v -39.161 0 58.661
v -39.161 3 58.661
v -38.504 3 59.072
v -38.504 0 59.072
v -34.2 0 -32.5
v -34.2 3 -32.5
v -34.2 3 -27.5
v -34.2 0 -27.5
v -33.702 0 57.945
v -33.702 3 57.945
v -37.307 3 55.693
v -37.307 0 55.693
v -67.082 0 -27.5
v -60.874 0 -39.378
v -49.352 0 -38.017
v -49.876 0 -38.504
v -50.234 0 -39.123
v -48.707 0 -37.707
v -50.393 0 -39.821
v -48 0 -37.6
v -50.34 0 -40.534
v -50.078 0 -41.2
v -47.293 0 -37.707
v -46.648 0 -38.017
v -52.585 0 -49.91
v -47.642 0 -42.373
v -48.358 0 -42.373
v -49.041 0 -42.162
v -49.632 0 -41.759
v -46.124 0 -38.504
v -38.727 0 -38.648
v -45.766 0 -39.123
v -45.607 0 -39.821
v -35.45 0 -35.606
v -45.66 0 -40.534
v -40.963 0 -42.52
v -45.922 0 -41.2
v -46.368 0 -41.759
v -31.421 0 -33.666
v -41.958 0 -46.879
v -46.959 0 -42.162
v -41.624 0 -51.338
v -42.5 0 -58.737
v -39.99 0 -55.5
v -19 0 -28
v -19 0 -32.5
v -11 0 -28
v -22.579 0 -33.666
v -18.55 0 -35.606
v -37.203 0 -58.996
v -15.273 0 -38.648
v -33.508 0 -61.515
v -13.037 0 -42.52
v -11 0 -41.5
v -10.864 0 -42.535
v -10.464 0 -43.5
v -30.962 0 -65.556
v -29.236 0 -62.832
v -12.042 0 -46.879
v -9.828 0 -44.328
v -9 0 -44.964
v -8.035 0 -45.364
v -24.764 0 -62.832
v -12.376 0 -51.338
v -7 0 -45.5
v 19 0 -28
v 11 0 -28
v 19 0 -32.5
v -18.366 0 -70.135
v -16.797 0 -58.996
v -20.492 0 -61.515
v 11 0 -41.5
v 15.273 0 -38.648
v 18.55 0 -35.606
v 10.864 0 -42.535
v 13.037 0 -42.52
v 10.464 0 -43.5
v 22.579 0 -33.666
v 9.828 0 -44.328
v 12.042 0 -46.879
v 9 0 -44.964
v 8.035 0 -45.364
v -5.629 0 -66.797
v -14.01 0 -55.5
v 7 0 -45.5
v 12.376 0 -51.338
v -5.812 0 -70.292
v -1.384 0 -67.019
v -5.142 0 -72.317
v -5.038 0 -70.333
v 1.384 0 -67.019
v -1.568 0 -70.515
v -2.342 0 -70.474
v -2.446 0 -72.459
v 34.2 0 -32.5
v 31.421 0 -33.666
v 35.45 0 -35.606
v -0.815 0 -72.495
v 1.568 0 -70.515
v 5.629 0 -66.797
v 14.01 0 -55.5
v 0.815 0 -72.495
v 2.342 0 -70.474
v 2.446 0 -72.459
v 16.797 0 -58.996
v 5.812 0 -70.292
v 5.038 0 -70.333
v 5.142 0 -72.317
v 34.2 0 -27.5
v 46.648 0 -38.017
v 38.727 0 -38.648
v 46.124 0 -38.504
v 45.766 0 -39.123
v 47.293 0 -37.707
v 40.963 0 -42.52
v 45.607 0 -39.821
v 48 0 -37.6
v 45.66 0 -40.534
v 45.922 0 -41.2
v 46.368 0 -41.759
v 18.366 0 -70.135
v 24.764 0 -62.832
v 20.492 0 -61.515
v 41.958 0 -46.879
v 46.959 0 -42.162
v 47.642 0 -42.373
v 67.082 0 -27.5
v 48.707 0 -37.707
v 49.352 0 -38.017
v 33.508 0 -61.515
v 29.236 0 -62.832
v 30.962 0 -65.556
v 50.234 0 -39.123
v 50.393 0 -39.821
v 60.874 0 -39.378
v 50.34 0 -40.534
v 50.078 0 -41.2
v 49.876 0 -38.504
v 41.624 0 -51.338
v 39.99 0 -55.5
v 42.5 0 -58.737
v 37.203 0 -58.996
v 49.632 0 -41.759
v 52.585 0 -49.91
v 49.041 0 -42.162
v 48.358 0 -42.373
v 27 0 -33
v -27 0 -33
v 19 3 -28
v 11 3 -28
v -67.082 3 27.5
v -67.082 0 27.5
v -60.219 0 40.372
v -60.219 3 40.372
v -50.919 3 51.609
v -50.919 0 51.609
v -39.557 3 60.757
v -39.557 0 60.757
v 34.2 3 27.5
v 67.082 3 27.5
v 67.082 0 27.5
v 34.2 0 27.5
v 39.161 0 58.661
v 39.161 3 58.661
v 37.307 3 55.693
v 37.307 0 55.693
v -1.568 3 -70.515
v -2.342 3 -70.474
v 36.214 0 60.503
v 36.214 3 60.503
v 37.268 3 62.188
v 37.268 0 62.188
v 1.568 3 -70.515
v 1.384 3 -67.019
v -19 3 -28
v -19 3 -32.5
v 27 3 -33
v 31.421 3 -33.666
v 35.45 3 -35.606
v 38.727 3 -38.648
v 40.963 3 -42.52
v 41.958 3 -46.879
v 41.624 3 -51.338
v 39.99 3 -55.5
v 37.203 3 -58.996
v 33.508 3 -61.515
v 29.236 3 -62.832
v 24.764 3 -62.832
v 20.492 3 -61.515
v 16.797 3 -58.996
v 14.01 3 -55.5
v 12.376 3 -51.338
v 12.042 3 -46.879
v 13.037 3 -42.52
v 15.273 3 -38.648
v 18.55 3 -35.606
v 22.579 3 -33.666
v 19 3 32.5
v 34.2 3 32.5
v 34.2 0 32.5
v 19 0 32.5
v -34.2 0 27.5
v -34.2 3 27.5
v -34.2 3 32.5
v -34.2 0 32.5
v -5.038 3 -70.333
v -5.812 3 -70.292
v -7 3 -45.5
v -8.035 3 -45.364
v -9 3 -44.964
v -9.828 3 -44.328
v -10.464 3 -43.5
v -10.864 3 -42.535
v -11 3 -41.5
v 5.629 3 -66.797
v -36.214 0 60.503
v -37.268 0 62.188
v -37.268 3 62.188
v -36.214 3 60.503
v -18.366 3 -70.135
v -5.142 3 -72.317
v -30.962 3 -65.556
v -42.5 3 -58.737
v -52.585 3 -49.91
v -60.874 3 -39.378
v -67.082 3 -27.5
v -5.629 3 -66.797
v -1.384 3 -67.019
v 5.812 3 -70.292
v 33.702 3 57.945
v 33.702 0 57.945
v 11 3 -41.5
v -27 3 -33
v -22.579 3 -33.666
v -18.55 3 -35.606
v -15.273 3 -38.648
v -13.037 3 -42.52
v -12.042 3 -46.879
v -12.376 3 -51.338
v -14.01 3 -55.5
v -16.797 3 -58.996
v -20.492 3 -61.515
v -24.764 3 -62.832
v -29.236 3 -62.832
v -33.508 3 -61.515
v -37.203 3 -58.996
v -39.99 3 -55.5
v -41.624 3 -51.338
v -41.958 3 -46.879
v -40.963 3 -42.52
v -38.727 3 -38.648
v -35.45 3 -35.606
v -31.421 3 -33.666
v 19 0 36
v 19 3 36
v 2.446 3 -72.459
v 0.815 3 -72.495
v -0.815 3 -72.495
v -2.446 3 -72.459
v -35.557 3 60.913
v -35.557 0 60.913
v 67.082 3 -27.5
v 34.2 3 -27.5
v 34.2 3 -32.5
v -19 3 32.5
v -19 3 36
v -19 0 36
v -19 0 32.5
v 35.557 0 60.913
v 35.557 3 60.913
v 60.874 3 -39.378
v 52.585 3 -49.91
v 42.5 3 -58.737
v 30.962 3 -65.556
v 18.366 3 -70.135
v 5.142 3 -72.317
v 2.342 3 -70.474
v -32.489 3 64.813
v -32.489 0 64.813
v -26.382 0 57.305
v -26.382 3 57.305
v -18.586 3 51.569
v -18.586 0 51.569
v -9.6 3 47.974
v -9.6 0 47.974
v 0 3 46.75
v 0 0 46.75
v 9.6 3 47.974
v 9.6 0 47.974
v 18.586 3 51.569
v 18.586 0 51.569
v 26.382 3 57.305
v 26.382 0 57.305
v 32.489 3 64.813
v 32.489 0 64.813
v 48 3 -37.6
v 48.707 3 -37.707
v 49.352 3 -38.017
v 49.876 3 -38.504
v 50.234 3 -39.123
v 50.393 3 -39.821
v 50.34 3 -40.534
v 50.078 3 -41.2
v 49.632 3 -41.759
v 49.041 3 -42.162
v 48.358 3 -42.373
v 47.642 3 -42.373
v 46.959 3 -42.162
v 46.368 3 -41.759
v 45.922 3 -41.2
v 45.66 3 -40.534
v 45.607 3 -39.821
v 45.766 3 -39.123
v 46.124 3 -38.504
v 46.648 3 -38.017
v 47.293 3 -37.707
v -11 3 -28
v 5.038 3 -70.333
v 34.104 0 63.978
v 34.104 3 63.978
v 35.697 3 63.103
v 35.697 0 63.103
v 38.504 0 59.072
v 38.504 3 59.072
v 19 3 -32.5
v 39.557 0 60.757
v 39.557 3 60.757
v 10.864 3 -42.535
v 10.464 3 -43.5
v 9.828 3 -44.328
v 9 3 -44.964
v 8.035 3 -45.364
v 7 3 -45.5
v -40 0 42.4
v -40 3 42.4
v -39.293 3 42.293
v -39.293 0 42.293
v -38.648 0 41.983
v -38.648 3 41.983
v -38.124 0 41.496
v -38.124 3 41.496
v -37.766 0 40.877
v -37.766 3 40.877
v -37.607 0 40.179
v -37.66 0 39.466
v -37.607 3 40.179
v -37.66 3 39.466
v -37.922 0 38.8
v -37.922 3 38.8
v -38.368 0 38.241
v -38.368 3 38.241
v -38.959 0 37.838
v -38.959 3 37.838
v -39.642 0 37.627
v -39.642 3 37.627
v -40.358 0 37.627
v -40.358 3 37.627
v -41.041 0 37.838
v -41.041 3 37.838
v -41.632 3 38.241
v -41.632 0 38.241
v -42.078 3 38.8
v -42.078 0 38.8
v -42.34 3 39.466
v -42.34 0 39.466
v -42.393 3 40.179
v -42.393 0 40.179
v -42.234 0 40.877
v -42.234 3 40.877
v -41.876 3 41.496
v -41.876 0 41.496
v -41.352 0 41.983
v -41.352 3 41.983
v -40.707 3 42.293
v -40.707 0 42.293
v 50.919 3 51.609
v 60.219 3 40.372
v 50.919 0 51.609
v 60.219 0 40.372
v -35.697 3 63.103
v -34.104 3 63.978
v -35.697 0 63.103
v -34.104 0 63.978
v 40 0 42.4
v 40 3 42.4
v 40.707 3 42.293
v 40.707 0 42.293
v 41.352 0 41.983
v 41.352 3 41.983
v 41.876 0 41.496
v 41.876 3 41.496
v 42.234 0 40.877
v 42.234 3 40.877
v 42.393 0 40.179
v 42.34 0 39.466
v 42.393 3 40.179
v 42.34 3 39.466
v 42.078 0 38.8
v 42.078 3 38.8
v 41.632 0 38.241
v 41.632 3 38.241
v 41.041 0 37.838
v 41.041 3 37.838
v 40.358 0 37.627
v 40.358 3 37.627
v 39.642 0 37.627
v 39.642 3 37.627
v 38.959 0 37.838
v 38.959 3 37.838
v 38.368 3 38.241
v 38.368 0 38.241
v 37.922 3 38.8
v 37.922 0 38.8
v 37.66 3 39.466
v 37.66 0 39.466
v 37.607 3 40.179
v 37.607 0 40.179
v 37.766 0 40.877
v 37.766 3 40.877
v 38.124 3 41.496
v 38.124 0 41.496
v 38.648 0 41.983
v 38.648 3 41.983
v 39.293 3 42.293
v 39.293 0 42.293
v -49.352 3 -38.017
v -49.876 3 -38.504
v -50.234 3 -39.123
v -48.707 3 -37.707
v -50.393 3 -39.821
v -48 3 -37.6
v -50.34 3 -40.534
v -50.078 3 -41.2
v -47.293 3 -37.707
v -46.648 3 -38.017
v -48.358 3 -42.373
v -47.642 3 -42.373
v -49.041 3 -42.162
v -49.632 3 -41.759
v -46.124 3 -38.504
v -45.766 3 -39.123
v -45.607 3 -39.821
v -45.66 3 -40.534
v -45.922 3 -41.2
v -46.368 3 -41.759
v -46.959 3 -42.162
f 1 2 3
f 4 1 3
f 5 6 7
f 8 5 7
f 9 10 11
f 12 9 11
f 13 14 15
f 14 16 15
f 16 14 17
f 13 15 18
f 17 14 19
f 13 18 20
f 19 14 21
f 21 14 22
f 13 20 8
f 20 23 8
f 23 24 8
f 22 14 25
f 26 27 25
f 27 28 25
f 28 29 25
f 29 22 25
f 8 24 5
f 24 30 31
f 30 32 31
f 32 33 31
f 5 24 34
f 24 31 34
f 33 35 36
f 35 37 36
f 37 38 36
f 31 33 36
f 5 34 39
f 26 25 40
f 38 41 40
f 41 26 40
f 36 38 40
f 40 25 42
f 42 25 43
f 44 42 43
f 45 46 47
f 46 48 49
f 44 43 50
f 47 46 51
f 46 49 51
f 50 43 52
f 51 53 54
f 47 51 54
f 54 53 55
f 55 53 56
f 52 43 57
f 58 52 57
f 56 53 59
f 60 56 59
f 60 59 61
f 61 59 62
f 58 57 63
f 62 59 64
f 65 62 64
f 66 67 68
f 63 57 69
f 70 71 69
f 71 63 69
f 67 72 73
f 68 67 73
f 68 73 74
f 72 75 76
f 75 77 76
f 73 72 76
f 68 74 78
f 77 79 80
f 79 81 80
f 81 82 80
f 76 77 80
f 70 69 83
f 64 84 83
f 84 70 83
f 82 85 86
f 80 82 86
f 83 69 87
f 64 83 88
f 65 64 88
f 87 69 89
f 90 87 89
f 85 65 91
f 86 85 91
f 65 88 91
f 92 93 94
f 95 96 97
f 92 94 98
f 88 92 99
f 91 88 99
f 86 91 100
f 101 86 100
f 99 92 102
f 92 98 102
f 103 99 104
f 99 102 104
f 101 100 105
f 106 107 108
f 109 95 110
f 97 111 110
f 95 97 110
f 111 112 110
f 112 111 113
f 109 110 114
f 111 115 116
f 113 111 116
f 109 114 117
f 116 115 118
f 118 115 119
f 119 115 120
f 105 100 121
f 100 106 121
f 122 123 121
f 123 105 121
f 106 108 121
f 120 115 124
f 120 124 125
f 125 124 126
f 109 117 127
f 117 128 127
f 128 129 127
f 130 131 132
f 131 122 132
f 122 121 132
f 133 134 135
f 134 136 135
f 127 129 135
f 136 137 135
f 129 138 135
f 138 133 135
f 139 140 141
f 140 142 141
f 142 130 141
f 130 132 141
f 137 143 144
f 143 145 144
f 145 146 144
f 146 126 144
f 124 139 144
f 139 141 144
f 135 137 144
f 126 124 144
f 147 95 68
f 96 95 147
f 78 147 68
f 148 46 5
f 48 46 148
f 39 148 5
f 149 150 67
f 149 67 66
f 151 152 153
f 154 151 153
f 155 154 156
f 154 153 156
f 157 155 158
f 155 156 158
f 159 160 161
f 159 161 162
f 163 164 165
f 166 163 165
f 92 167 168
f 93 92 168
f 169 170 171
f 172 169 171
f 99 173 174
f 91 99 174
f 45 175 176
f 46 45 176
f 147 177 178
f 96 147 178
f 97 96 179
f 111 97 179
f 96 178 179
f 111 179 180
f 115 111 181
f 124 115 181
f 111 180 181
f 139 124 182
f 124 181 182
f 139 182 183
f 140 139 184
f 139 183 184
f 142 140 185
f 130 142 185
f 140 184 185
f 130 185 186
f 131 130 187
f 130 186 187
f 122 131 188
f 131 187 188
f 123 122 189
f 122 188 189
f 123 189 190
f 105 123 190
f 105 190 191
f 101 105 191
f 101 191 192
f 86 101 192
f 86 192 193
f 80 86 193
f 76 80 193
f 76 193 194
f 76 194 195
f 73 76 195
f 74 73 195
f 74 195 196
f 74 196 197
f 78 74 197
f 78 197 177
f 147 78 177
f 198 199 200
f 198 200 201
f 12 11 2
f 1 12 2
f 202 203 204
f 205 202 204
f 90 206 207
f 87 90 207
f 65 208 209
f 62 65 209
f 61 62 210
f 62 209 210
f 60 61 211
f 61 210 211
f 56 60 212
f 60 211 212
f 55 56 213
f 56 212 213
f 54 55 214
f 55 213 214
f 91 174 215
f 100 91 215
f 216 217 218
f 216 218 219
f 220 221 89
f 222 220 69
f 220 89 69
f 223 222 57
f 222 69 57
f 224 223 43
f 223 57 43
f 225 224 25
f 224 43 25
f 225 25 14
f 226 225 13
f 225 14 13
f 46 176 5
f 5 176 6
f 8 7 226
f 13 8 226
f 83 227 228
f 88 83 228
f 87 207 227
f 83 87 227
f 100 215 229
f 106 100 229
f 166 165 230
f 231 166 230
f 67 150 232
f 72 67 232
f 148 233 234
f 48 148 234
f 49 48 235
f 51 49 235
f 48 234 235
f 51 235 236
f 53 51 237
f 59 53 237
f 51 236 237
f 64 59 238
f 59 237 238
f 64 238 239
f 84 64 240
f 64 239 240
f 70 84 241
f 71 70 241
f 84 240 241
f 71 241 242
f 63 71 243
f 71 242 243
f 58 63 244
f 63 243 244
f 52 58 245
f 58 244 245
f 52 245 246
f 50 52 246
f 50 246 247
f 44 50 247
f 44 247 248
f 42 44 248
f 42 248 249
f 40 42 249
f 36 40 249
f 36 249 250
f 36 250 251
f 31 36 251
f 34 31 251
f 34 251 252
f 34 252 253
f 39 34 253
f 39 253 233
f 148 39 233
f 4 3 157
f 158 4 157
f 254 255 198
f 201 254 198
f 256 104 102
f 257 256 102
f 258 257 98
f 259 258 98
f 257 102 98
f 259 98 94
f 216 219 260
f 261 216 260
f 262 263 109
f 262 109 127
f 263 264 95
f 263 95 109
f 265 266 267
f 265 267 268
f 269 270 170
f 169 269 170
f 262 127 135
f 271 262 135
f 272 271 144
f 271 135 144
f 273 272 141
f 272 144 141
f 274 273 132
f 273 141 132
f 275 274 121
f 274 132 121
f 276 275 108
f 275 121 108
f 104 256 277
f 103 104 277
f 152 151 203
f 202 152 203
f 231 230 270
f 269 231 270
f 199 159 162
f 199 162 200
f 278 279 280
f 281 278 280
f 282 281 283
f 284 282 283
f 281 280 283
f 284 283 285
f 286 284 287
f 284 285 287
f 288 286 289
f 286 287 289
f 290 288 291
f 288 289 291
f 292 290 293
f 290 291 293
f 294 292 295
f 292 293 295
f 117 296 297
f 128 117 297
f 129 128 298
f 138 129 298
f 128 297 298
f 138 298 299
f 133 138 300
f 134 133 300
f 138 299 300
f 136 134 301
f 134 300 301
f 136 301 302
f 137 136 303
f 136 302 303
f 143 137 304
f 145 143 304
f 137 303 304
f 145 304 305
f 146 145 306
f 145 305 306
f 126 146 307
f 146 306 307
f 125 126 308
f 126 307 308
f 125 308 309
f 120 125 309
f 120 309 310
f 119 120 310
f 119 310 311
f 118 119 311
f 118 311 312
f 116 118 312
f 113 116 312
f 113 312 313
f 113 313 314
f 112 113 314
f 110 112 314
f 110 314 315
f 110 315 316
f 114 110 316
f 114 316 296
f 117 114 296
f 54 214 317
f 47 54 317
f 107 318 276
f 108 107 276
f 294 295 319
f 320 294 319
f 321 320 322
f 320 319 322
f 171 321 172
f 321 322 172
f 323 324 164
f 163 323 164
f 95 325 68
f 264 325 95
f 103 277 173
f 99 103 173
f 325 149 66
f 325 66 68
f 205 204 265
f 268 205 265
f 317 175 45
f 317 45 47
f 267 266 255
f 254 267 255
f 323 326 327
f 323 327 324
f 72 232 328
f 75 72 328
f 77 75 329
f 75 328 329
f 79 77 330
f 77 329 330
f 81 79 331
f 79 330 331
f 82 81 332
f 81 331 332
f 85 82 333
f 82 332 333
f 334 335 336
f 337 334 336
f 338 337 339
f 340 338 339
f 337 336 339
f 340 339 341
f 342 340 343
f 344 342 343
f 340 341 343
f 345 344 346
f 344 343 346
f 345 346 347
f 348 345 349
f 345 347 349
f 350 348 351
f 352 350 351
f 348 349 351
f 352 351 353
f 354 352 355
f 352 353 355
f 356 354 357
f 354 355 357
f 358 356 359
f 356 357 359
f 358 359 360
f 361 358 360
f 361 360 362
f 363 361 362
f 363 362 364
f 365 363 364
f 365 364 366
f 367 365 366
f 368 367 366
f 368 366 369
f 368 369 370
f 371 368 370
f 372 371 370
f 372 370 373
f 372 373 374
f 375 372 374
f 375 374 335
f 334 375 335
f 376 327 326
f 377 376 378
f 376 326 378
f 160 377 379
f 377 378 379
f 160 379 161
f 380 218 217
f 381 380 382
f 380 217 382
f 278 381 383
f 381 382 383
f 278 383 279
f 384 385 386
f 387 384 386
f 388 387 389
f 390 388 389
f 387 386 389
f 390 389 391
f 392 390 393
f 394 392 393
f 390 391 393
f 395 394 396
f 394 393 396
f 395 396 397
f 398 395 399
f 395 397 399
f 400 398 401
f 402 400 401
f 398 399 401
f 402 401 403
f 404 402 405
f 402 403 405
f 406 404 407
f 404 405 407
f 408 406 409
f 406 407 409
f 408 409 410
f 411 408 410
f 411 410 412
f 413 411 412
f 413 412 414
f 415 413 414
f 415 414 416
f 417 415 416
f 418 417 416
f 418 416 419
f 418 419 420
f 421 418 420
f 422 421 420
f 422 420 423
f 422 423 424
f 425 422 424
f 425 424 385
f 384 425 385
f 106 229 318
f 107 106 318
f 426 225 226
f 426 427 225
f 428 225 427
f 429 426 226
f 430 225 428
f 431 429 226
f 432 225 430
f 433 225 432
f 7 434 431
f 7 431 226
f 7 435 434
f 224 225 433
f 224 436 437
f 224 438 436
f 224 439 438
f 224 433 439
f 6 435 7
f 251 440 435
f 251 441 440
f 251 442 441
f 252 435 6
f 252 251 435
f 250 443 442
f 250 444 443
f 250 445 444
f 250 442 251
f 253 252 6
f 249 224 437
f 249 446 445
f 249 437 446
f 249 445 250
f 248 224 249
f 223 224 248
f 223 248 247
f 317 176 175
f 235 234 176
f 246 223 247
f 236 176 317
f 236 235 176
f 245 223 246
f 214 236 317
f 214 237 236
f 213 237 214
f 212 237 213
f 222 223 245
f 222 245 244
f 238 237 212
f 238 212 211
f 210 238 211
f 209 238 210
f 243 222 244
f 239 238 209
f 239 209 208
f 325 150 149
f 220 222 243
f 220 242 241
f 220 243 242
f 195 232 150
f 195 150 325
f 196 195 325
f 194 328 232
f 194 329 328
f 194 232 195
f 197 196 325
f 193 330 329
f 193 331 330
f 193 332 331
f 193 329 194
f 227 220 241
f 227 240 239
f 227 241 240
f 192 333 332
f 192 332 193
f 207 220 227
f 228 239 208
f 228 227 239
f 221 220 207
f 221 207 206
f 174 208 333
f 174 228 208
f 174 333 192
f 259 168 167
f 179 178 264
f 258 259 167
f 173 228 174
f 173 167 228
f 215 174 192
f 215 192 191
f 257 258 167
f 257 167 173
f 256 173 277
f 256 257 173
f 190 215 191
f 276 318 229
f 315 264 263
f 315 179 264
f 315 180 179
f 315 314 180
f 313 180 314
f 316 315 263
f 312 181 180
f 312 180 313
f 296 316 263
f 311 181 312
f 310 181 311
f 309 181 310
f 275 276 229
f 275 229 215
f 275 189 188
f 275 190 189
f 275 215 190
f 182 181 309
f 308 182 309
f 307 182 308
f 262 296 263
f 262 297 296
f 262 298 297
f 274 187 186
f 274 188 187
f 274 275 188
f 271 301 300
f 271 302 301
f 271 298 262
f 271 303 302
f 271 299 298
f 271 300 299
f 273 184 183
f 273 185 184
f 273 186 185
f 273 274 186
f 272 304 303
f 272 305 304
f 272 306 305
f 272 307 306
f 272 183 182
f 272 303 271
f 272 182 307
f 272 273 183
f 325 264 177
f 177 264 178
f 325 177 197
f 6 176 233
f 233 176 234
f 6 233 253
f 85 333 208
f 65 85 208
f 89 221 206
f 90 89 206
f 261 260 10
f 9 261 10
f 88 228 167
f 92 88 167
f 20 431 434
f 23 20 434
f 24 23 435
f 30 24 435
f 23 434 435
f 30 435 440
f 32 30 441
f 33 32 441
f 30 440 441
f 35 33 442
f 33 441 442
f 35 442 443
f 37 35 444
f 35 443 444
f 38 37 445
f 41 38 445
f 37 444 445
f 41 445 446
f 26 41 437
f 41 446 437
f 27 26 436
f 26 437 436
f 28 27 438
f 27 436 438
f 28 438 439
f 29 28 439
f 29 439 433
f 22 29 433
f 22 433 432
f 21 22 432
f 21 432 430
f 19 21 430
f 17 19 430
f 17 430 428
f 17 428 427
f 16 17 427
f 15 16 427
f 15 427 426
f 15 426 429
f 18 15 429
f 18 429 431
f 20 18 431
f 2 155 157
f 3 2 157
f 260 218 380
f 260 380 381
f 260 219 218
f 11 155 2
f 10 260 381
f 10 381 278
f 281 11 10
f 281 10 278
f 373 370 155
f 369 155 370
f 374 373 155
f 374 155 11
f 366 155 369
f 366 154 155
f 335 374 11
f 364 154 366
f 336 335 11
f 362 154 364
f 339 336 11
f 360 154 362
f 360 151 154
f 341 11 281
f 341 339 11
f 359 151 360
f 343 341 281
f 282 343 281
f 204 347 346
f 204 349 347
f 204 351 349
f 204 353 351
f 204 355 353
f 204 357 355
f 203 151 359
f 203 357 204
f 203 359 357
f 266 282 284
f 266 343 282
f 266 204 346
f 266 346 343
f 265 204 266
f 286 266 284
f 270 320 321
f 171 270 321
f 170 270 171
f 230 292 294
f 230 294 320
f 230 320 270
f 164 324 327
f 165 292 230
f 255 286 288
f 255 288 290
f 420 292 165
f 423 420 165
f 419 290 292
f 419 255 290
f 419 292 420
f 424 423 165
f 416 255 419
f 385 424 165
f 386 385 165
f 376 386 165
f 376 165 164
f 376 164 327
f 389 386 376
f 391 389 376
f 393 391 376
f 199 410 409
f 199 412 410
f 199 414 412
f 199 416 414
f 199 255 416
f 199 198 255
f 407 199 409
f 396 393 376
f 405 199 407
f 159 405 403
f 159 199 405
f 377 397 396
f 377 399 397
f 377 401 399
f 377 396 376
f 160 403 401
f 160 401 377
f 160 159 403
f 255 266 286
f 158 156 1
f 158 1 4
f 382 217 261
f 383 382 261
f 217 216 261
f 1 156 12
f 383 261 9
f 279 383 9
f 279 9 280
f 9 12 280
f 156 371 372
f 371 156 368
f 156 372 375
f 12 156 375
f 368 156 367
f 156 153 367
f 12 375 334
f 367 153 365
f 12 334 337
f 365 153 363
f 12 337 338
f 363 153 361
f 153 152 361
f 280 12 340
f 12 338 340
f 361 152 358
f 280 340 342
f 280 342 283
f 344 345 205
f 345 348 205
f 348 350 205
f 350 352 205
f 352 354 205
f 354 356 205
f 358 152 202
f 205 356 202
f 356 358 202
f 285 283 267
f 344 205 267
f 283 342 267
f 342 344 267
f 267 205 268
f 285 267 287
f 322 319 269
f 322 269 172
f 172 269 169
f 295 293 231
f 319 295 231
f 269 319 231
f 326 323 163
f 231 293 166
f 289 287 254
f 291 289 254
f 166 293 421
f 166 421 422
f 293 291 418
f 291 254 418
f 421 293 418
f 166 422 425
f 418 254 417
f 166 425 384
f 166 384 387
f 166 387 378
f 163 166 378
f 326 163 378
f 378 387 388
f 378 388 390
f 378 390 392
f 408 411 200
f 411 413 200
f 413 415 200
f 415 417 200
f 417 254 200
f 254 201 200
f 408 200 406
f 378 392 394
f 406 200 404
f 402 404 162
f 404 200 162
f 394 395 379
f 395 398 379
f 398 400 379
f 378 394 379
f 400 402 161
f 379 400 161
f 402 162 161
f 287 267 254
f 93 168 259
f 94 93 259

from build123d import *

# Parameters (mm, degrees)
BOSS_EXTRUDE1_DEPTH  = 3
SOLENOID_PLACEMENT_W = 38
SOLENOID_PLACEMENT_H = 64
CUT_EXTRUDE1_DEPTH   = 103.574363269
SKETCH3_R            = 12
CUT_EXTRUDE3_DEPTH   = 103.574363269
SKETCH4_R            = 2.4
CUT_EXTRUDE4_DEPTH   = 103.574363269
CUT_EXTRUDE2_DEPTH   = 103.574363269
CUT_EXTRUDE5_DEPTH   = 99.819279495
SKETCH6_R            = 15
CUT_EXTRUDE10_DEPTH  = 99.819279495
CUT_EXTRUDE11_DEPTH  = 99.819279495


with BuildPart() as part:
    # Sketch1 → Boss-Extrude1 (new body)
    with BuildSketch(Plane(origin=(0, 0, 0), x_dir=(1, 0, 0), z_dir=(0, 1, 0))):
        with BuildLine():
            ThreePointArc((32.48910875, -64.812867647), (0, 72.5), (-32.48910875, -64.812867647))
            ThreePointArc((-32.48910875, -64.812867647), (0, -46.75), (32.48910875, -64.812867647))
        make_face()
    extrude(amount=BOSS_EXTRUDE1_DEPTH)

    # solenoid placement → Cut-Extrude1 (cut, through all)
    with BuildSketch(Plane(origin=(0, 3, 0), x_dir=(1, 0, 0), z_dir=(0, 1, 0))):
        with Locations((0, -4)):
            Rectangle(SOLENOID_PLACEMENT_W, SOLENOID_PLACEMENT_H)
    extrude(amount=-CUT_EXTRUDE1_DEPTH, mode=Mode.SUBTRACT)

    # Sketch3 → Cut-Extrude3 (cut, through all)
    with BuildSketch(Plane(origin=(0, 3, 0), x_dir=(1, 0, 0), z_dir=(0, 1, 0))):
        with Locations(Location((27, 48, 0), (0, 0, 270))):
            Circle(SKETCH3_R)
        with Locations(Location((-27, 48, 0), (0, 0, 270))):
            Circle(SKETCH3_R)
    extrude(amount=-CUT_EXTRUDE3_DEPTH, mode=Mode.SUBTRACT)

    # Sketch4 → Cut-Extrude4 (cut, through all)
    with BuildSketch(Plane(origin=(0, 3, 0), x_dir=(1, 0, 0), z_dir=(0, 1, 0))):
        with Locations(Location((40, -40, 0), (0, 0, 270))):
            Circle(SKETCH4_R)
        with Locations(Location((-40, -40, 0), (0, 0, 270))):
            Circle(SKETCH4_R)
        with Locations(Location((48, 40, 0), (0, 0, 270))):
            Circle(SKETCH4_R)
        with Locations(Location((-48, 40, 0), (0, 0, 270))):
            Circle(SKETCH4_R)
    extrude(amount=-CUT_EXTRUDE4_DEPTH, mode=Mode.SUBTRACT)

    # Sketch2 → Cut-Extrude2 (cut, through all)
    with BuildSketch(Plane(origin=(0, 3, 0), x_dir=(1, 0, 0), z_dir=(0, 1, 0))):
        with BuildLine():
            Line((34.2, -27.5), (34.2, -32.5))
            Line((34.2, -32.5), (22.2, -32.5))
            Line((22.2, -32.5), (19, -32.5))
            Line((19, -32.5), (19, 32.5))
            Line((19, 32.5), (22.2, 32.5))
            Line((22.2, 32.5), (34.2, 32.5))
            Line((34.2, 32.5), (34.2, 27.5))
            Line((34.2, 27.5), (67.082039325, 27.5))
            ThreePointArc((67.082039325, 27.5), (72.5, 0), (67.082039325, -27.5))
            Line((67.082039325, -27.5), (34.2, -27.5))
        make_face()
        with BuildLine():
            Line((-34.2, -32.5), (-22.2, -32.5))
            Line((-22.2, -32.5), (-19, -32.5))
            Line((-19, -32.5), (-19, 32.5))
            Line((-19, 32.5), (-22.2, 32.5))
            Line((-22.2, 32.5), (-34.2, 32.5))
            Line((-34.2, 32.5), (-34.2, 27.5))
            Line((-34.2, 27.5), (-67.082039325, 27.5))
            ThreePointArc((-67.082039325, 27.5), (-72.5, 0), (-67.082039325, -27.5))
            Line((-67.082039325, -27.5), (-34.2, -27.5))
            Line((-34.2, -27.5), (-34.2, -32.5))
        make_face()
    extrude(amount=-CUT_EXTRUDE2_DEPTH, mode=Mode.SUBTRACT)


with BuildPart() as cut_extrude2_piece_1:
    # of the separate pieces the step leaves, piece 1, a body of its own (cut_extrude2_pieces)
    add(part.part.solids().sort_by_distance((67.082039325, 0, -27.5))[0])

    # Sketch5 → Cut-Extrude5 (cut, through all)
    with BuildSketch(Plane(origin=(0, 3, 0), x_dir=(1, 0, 0), z_dir=(0, 1, 0))):
        with BuildLine():
            Line((-11, 41.5), (-11, 28))
            Line((-11, 28), (11, 28))
            Line((11, 28), (11, 41.5))
            ThreePointArc((11, 41.5), (9.828427125, 44.328427125), (7, 45.5))
            Line((7, 45.5), (-7, 45.5))
            ThreePointArc((-7, 45.5), (-9.828427125, 44.328427125), (-11, 41.5))
        make_face()
    extrude(amount=-CUT_EXTRUDE5_DEPTH, mode=Mode.SUBTRACT)

    # Sketch6 → Cut-Extrude10 (cut, through all)
    with BuildSketch(Plane(origin=(0, 3, 0), x_dir=(-1, 0, 0), z_dir=(0, 1, 0))):
        with Locations(Location((-27, -48, 0), (0, 0, 90))):
            Circle(SKETCH6_R)
        with Locations(Location((27, -48, 0), (0, 0, 90))):
            Circle(SKETCH6_R)
    extrude(amount=-CUT_EXTRUDE10_DEPTH, mode=Mode.SUBTRACT)


with BuildPart() as cut_extrude2_piece_2:
    # of the separate pieces the step leaves, piece 2, a body of its own (cut_extrude2_pieces)
    add(part.part.solids().sort_by_distance((32.48910875, 0, 64.812867647))[0])


with BuildPart() as cut_extrude11_tool:
    # Sketch7 → Cut-Extrude11 (new, through all)
    with BuildSketch(Plane(origin=(0, 3, 0), x_dir=(1, 0, 0), z_dir=(0, 1, 0))):
        Polygon((-5.037834787, 70.332728659), (-5.811772676, 70.292168293), (-5.62859683, 66.796964922), (-1.384421307, 67.019392736), (-1.567597154, 70.514596107), (-2.341535043, 70.474035741), (-2.446206956, 72.471294811), (-5.1425067, 72.329987729), align=None)
        Polygon((5.811772676, 70.292168293), (5.037834787, 70.332728659), (5.1425067, 72.329987729), (2.446206956, 72.471294811), (2.341535043, 70.474035741), (1.567597154, 70.514596107), (1.384421307, 67.019392736), (5.62859683, 66.796964922), align=None)
        Polygon((38.504173058, -59.071999772), (39.161410333, -58.661312343), (37.306692908, -55.693144006), (33.702488499, -57.945300879), (35.557205924, -60.913469216), (36.214443199, -60.502781786), (37.274281727, -62.198877978), (39.564011587, -60.768095965), align=None)
        Polygon((-39.161410333, -58.661312343), (-38.504173058, -59.071999772), (-39.564011587, -60.768095965), (-37.274281727, -62.198877978), (-36.214443199, -60.502781786), (-35.557205924, -60.913469216), (-33.702488499, -57.945300879), (-37.306692908, -55.693144006), align=None)
    extrude(amount=-CUT_EXTRUDE11_DEPTH)


with BuildPart() as cut_extrude2_piece_1_1:
    add(cut_extrude2_piece_1.part)

    # Cut-Extrude11: cut by cut_extrude11_tool
    add(cut_extrude11_tool.part, mode=Mode.SUBTRACT)


with BuildPart() as cut_extrude2_piece_2_1:
    add(cut_extrude2_piece_2.part)

    # Cut-Extrude11: cut by cut_extrude11_tool
    add(cut_extrude11_tool.part, mode=Mode.SUBTRACT)


solid = Compound([cut_extrude2_piece_1_1.part, cut_extrude2_piece_2_1.part])
